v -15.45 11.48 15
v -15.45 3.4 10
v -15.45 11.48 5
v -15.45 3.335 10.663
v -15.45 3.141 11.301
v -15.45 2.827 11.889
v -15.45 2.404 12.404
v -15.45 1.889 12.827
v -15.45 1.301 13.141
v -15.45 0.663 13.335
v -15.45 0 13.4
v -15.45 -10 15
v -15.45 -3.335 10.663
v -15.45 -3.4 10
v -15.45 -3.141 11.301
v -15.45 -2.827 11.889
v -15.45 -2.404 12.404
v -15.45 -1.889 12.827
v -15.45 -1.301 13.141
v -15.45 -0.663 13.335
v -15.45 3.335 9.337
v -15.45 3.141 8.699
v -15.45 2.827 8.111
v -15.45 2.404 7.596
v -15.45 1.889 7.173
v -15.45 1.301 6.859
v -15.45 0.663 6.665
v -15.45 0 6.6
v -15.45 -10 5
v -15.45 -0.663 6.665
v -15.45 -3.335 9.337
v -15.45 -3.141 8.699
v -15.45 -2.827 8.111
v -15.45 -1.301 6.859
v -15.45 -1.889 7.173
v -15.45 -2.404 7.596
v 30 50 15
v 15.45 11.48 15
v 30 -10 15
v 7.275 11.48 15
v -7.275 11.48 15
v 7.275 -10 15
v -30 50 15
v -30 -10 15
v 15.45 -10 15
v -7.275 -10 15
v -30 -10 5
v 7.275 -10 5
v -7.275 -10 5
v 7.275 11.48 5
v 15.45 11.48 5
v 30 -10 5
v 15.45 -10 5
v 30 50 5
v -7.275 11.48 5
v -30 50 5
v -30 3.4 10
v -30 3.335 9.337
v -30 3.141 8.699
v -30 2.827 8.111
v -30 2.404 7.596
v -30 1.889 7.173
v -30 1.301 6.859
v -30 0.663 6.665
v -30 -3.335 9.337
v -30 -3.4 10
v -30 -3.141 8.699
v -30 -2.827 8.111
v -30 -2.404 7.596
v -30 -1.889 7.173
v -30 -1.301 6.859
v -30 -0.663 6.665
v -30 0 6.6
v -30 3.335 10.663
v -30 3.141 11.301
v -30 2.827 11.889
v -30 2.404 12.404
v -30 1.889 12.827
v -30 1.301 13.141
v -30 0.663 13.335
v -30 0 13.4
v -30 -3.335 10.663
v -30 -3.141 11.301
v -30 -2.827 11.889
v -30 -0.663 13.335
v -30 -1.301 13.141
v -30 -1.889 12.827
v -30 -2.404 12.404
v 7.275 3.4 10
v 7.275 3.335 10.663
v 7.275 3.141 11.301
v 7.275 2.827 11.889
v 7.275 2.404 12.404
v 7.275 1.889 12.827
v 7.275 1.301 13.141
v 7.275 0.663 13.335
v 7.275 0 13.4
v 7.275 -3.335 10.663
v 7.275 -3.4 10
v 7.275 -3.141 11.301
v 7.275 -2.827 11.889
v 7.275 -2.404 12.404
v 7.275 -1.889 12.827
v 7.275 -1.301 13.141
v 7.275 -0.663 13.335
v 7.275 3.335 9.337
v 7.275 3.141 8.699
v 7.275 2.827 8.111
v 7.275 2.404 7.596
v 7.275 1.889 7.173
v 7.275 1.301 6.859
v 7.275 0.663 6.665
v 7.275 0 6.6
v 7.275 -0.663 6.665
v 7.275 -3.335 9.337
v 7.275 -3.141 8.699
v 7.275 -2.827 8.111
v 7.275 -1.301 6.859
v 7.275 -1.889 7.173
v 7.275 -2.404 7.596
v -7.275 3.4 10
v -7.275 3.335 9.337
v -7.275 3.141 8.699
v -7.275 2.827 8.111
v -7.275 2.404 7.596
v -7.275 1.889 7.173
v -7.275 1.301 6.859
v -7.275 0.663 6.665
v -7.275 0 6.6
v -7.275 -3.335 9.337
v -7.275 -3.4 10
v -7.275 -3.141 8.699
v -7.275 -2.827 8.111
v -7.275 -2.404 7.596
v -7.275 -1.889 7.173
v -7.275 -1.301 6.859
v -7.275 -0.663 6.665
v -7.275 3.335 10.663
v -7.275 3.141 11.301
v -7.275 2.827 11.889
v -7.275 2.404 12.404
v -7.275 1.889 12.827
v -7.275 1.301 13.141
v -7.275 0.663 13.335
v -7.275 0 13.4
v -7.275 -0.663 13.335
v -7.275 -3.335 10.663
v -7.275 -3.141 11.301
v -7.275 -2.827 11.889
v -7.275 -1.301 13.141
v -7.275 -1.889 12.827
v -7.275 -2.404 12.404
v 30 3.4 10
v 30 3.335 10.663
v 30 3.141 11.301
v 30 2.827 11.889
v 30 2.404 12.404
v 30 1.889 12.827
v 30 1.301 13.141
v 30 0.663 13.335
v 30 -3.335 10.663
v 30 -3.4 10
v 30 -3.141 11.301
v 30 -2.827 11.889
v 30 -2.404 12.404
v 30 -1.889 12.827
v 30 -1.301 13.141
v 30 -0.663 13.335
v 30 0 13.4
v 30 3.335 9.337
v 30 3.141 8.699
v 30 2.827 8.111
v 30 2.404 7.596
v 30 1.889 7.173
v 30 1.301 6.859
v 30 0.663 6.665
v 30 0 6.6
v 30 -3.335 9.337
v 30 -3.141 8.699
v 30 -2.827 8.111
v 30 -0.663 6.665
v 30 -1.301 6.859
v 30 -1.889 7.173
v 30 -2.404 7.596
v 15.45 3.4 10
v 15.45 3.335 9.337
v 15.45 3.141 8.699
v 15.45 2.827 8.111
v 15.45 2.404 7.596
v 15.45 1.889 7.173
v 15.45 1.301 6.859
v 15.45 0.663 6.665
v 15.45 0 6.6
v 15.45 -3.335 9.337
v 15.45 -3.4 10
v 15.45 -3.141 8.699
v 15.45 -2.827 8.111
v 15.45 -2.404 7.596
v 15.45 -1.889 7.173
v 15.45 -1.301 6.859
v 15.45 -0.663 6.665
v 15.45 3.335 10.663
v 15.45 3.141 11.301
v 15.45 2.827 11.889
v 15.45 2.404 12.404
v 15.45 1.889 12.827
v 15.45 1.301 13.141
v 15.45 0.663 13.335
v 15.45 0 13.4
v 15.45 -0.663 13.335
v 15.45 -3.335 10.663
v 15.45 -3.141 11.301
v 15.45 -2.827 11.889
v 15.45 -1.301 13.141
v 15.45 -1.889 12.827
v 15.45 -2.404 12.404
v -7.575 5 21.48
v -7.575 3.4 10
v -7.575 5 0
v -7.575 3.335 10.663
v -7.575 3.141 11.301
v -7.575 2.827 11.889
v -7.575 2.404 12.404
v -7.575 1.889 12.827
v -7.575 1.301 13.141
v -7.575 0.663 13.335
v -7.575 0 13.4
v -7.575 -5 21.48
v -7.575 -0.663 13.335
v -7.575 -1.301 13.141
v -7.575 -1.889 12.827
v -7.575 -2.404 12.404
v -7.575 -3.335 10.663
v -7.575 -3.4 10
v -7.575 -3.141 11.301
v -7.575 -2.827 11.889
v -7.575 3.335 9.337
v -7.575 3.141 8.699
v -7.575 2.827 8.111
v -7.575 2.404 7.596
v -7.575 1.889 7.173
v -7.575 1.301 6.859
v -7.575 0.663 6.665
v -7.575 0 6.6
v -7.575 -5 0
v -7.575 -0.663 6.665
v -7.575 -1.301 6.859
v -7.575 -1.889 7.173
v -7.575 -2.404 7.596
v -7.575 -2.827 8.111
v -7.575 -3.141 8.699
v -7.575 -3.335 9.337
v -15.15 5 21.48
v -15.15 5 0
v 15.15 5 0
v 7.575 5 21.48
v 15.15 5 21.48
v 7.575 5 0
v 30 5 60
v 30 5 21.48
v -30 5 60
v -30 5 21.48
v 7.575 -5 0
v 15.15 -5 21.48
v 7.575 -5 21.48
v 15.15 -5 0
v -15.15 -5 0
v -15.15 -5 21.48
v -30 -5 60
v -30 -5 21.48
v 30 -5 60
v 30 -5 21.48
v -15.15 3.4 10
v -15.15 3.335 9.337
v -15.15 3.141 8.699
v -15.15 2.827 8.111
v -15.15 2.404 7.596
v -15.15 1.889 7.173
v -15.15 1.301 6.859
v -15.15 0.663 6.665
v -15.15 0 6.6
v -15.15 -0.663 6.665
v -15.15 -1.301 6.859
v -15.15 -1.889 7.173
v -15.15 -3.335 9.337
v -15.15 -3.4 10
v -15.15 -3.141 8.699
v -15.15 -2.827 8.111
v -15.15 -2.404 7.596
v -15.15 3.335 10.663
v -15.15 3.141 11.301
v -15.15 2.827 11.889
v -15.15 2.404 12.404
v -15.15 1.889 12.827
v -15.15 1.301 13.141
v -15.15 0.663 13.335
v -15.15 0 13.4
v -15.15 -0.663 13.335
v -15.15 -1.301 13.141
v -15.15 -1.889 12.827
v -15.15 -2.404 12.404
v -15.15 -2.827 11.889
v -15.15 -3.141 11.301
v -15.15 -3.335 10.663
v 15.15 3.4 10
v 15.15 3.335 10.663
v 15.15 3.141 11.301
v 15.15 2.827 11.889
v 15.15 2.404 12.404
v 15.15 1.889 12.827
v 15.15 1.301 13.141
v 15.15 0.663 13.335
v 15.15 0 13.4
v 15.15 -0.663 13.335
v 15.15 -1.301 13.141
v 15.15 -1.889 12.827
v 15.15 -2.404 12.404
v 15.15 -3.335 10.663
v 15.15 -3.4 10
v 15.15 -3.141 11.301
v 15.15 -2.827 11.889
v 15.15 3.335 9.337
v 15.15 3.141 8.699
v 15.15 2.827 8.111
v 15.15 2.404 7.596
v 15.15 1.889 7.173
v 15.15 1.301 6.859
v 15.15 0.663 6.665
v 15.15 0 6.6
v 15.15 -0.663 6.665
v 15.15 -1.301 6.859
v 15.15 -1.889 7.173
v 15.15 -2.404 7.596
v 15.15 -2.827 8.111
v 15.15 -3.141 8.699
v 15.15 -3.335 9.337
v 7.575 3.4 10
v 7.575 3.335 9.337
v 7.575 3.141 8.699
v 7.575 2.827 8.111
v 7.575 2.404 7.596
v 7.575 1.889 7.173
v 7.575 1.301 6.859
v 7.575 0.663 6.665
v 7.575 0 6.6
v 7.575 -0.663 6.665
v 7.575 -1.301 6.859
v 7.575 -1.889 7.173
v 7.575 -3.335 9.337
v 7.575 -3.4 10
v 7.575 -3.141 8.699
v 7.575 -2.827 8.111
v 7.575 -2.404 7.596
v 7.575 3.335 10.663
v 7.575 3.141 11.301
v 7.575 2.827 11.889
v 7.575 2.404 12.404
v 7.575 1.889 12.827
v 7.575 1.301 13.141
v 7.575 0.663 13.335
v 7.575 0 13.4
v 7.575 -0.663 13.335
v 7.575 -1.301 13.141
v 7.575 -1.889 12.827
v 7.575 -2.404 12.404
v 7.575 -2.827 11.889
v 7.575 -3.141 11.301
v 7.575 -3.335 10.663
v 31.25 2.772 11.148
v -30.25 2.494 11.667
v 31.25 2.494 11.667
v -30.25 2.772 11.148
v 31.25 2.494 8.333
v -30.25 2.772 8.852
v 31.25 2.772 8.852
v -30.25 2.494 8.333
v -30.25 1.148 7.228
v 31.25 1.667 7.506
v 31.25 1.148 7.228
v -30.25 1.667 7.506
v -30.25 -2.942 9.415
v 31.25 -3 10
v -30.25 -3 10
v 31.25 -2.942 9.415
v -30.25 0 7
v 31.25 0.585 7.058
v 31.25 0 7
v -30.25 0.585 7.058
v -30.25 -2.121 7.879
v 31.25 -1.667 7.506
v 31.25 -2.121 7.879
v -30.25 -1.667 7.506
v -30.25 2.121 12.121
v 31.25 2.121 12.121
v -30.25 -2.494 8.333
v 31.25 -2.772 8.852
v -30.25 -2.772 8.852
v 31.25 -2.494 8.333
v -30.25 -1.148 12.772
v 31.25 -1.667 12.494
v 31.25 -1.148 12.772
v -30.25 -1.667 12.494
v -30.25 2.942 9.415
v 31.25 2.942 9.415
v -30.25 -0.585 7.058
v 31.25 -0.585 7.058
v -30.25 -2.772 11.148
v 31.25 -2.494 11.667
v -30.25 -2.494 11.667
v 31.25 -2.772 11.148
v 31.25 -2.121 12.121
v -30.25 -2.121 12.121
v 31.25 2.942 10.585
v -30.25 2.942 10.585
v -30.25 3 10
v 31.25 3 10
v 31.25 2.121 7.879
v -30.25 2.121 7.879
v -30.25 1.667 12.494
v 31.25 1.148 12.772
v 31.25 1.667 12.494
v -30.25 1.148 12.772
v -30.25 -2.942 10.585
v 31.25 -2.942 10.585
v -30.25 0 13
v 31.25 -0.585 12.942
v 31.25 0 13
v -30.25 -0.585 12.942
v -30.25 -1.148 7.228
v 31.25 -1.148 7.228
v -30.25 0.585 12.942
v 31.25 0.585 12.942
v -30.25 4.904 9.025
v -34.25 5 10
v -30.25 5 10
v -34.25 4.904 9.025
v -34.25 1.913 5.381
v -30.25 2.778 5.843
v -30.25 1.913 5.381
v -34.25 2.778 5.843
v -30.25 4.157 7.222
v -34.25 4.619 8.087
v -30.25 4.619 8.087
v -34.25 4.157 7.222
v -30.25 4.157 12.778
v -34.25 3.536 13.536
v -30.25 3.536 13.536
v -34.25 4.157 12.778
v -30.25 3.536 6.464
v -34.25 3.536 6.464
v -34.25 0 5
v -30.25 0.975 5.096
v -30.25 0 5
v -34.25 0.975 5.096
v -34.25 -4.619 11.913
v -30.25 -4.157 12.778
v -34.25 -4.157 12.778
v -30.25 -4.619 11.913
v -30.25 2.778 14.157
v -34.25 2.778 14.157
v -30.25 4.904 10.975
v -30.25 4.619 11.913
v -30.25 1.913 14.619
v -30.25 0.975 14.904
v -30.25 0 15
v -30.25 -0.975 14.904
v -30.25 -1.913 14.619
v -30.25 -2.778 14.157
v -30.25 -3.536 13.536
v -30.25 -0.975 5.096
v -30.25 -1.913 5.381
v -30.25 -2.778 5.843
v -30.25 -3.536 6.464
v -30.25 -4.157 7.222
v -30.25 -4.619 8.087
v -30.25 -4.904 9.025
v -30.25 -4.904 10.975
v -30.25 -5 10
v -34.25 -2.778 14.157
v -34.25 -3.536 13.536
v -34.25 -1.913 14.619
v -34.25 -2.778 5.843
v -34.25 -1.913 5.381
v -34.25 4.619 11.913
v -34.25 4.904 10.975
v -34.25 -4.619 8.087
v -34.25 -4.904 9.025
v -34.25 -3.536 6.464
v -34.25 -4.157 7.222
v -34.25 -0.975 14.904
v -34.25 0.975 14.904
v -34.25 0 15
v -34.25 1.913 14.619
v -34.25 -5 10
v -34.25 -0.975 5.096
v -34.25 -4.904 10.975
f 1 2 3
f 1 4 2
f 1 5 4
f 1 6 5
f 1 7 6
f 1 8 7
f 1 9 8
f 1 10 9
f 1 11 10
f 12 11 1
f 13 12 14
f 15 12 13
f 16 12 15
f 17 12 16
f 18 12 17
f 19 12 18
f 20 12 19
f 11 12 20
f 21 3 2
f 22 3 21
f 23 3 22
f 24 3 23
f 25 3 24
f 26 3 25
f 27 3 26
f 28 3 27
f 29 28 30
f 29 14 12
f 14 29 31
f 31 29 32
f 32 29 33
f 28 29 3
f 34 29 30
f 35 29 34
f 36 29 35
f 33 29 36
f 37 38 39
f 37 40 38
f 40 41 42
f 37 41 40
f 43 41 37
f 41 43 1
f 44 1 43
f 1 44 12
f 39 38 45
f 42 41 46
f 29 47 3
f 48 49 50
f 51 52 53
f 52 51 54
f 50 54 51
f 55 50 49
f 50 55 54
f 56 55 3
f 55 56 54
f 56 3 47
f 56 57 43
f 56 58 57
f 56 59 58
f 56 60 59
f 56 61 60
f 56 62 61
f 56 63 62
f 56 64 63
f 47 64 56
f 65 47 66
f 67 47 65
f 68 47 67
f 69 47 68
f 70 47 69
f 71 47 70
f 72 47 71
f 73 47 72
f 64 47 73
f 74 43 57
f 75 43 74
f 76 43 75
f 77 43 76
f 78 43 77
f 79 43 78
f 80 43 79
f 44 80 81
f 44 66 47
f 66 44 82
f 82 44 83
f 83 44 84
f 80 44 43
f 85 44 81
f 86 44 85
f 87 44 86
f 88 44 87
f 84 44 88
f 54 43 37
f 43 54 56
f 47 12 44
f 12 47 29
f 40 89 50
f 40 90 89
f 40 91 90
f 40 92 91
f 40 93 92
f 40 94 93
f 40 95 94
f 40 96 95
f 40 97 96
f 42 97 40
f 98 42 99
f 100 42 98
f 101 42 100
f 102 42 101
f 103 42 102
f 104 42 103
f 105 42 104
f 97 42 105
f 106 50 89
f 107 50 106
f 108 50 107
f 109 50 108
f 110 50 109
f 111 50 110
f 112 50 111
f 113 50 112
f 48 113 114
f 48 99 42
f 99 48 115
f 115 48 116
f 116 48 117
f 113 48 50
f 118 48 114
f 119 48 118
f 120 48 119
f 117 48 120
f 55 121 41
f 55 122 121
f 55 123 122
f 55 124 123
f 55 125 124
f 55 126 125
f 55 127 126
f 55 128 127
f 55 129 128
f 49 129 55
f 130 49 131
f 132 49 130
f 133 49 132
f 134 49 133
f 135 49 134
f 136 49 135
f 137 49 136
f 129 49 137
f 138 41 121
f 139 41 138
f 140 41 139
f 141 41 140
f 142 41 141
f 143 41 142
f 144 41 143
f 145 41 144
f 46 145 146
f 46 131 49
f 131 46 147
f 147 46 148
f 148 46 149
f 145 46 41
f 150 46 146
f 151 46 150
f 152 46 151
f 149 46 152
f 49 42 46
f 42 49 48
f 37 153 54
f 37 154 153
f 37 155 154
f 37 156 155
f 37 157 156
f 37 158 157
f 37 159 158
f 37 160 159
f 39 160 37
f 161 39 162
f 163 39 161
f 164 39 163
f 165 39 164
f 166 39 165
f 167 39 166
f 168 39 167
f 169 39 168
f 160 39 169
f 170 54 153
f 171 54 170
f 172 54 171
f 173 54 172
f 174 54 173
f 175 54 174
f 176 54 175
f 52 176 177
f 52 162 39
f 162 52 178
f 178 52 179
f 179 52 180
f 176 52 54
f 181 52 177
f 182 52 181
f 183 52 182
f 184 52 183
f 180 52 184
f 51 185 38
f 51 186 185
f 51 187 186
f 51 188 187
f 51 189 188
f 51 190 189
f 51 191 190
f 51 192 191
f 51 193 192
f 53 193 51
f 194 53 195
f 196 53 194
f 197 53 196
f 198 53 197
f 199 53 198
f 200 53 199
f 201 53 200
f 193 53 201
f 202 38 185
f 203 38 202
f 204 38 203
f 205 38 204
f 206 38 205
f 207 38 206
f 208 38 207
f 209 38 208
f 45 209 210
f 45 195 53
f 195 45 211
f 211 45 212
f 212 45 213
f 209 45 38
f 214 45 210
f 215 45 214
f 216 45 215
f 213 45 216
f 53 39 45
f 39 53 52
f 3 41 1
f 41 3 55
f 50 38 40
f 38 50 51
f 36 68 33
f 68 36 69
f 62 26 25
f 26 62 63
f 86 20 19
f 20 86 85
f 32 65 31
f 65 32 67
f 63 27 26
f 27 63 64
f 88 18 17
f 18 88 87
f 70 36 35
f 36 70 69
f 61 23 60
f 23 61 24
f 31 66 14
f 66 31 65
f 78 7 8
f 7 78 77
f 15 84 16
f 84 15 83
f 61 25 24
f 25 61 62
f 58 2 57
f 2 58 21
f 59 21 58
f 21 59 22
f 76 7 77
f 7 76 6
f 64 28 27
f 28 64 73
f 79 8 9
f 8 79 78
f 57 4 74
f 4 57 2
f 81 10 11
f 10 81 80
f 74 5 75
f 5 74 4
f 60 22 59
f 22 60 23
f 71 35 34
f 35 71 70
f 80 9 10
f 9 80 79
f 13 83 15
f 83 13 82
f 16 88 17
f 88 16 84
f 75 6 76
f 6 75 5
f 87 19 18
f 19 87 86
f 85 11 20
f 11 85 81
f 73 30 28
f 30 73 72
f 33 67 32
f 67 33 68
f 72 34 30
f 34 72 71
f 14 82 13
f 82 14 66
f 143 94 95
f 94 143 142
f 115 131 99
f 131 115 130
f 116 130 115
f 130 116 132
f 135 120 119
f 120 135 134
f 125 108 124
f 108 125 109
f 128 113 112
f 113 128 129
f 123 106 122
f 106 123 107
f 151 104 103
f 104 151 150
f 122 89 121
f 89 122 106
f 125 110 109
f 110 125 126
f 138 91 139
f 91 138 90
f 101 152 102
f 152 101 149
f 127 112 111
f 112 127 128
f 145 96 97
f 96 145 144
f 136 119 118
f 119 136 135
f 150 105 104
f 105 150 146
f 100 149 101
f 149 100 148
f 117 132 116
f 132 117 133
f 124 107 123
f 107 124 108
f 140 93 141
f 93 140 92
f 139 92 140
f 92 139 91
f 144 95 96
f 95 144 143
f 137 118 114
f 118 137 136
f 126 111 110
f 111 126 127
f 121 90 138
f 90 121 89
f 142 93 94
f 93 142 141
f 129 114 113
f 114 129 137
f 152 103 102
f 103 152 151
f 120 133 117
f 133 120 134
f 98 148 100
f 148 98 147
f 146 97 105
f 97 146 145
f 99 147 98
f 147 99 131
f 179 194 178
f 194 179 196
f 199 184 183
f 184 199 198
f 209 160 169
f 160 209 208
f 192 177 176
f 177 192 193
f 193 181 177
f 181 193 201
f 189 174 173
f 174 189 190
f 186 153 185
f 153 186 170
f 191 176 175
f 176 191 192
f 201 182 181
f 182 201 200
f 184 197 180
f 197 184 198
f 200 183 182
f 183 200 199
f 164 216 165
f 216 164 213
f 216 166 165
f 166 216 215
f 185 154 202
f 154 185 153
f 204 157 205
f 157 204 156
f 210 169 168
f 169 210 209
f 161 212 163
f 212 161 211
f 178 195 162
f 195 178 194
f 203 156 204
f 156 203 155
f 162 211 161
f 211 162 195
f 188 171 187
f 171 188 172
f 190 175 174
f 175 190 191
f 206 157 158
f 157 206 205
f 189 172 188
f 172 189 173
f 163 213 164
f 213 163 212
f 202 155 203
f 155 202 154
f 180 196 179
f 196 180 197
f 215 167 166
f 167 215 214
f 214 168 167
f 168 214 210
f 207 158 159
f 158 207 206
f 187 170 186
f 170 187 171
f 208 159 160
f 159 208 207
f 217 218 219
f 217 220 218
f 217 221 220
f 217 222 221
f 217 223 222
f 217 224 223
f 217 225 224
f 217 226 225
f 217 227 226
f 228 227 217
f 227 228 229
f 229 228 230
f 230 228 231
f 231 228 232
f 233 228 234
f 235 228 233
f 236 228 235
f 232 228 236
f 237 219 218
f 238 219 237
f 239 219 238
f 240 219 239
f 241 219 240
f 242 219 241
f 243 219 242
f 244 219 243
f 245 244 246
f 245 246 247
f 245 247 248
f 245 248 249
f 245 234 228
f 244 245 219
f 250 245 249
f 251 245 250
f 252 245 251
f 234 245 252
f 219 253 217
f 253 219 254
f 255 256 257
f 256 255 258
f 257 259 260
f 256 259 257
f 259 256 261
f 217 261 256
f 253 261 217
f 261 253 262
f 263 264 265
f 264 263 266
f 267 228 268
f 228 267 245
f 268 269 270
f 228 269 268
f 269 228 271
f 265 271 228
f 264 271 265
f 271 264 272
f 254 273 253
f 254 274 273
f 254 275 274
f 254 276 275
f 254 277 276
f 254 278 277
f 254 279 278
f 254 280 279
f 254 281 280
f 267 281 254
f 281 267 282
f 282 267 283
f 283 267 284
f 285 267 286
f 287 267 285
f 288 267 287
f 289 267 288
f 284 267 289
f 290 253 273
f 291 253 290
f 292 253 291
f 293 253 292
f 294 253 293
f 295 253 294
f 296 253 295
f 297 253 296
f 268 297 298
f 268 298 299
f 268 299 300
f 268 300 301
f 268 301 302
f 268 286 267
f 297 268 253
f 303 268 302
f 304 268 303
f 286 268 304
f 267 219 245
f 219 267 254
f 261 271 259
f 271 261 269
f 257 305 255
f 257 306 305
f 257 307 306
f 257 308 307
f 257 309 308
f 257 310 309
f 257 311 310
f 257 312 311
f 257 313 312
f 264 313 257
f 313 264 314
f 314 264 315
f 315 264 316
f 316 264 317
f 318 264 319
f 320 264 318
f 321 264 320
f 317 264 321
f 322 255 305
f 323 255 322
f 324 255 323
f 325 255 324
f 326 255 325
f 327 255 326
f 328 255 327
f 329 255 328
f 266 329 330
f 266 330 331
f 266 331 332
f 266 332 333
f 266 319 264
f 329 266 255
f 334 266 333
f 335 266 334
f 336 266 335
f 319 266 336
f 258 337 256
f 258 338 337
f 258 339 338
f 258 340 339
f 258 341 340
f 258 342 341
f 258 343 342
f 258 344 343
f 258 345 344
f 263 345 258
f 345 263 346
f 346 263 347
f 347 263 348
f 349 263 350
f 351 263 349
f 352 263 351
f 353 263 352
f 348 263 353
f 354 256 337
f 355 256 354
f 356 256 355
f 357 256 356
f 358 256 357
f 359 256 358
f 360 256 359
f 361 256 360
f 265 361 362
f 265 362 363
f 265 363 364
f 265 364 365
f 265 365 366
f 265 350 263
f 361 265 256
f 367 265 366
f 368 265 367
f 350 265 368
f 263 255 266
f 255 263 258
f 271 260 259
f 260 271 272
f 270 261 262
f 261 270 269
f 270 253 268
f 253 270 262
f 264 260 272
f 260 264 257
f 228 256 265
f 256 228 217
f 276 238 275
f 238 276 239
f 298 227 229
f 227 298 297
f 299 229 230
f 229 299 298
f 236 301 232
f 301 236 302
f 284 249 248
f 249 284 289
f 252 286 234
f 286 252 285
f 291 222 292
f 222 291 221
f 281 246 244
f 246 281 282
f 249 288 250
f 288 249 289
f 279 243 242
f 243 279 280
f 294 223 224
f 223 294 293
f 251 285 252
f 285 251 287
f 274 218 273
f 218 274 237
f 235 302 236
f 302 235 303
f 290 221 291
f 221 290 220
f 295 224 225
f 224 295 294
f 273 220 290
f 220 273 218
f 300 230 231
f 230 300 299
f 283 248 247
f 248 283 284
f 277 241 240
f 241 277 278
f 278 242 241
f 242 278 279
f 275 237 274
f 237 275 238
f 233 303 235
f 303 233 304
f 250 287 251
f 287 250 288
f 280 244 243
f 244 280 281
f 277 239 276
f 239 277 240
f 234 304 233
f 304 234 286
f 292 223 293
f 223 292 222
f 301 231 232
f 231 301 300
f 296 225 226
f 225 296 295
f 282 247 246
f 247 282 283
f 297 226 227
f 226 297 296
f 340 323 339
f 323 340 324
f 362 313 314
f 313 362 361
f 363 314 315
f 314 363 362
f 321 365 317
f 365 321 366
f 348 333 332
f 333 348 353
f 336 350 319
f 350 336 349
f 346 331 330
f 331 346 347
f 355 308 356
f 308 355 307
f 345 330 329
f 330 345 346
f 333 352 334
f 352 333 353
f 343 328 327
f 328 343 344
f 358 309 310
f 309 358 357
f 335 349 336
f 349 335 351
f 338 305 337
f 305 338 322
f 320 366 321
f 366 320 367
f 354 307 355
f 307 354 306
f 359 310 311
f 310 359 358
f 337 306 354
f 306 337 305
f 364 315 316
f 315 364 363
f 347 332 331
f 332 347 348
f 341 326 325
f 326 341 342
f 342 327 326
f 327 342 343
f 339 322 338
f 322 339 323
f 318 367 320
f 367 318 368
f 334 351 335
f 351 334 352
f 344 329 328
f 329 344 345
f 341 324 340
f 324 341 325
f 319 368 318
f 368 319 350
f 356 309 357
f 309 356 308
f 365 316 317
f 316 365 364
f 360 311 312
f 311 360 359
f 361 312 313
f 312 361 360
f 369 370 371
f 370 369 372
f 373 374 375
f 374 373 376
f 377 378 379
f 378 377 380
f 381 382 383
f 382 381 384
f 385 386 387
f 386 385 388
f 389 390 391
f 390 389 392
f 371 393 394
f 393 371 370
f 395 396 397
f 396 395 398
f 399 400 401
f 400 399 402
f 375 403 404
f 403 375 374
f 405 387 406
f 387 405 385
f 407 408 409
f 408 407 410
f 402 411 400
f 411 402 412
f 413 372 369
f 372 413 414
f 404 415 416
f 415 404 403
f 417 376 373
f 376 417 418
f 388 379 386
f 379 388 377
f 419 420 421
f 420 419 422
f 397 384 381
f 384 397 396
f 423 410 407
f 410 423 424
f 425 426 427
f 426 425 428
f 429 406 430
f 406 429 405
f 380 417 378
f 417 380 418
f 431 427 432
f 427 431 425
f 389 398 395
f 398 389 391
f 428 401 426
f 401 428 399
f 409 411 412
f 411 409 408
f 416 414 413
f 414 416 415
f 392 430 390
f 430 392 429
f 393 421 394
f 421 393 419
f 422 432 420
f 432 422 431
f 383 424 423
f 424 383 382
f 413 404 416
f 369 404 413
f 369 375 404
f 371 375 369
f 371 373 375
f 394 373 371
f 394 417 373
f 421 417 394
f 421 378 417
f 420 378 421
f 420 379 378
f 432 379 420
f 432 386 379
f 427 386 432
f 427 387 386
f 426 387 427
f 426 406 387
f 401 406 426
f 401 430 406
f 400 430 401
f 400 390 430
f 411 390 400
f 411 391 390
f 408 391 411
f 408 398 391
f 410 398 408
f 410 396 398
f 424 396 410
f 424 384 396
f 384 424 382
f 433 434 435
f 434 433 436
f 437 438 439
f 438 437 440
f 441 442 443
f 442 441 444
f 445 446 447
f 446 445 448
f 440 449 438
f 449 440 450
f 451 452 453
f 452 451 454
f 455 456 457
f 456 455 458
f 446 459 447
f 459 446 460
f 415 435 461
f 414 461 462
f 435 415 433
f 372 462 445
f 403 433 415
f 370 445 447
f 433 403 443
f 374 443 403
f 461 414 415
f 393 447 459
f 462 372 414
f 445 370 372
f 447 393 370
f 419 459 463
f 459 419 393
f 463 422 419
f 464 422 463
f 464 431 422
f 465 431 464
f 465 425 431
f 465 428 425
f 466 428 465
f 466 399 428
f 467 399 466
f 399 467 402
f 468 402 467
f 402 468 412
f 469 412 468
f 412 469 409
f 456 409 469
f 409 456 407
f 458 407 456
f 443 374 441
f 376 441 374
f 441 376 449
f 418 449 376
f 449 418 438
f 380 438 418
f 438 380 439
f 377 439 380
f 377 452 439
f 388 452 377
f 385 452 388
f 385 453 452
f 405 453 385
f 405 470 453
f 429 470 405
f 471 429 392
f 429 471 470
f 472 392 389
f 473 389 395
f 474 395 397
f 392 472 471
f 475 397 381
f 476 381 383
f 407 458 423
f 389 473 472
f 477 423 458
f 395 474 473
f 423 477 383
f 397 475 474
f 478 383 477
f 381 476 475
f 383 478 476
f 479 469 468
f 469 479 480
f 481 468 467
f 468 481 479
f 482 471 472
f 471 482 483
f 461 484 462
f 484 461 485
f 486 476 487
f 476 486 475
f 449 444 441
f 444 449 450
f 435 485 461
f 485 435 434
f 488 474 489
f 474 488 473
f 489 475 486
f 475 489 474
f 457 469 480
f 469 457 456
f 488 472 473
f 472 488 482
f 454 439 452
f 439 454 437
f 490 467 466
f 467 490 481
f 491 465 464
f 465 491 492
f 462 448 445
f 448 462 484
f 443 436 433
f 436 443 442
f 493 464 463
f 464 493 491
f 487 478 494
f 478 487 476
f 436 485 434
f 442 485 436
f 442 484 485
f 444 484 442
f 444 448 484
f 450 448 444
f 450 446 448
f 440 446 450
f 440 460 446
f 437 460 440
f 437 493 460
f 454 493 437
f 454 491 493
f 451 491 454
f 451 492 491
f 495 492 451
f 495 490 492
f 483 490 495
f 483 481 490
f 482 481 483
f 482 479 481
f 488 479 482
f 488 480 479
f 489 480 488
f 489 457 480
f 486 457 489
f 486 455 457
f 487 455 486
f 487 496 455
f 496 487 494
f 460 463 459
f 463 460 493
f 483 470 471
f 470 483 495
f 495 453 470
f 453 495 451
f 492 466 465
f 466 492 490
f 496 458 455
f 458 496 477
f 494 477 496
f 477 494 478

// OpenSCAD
$fn = 32;

// ------------------------------------------------------------------------
// Butt hinge: hinge 60 mm, leaf swung 270 deg
// Every part is its own module, assembly() places every instance.
// ------------------------------------------------------------------------

// --- part 1 ---
module hinge_base() {
  difference() {
    union() {
      translate([-30, -10, -5]) cube([14.55, 60, 10]);
      translate([-7.275, -10, -5]) cube([14.55, 60, 10]);
      translate([15.45, -10, -5]) cube([14.55, 60, 10]);
      translate([-30, 11.48, -5]) cube([60, 38.52, 10]);
    }
    translate([-22.725, 0, 0]) rotate([0, 90, 0]) cylinder(h = 16.55, d = 6.8, center = true);
    translate([0, 0, 0]) rotate([0, 90, 0]) cylinder(h = 16.55, d = 6.8, center = true);
    translate([22.725, 0, 0]) rotate([0, 90, 0]) cylinder(h = 16.55, d = 6.8, center = true);
  }
}

// --- part 2 ---
module hinge_mover() {
  difference() {
    union() {
      translate([-15.15, -50, -5]) cube([7.575, 60, 10]);
      translate([7.575, -50, -5]) cube([7.575, 60, 10]);
      translate([-30, -50, -5]) cube([60, 38.52, 10]);
    }
    translate([-11.362, 0, 0]) rotate([0, 90, 0]) cylinder(h = 9.575, d = 6.8, center = true);
    translate([11.362, 0, 0]) rotate([0, 90, 0]) cylinder(h = 9.575, d = 6.8, center = true);
  }
}

// --- part 3 ---
module hinge_pin() {
  rotate([0, 90, 0]) cylinder(h = 62.5, d = 6, center = true);
  translate([-34.25, 0, 0]) rotate([0, 90, 0]) cylinder(h = 4, d = 10);
}

// --- assembly ---
module assembly() {
  color([0.80, 0.24, 0.20]) translate([0, 0, 10]) rotate([0, 0, 0]) hinge_base();
  color([0.20, 0.45, 0.75]) translate([0, 0, 10]) rotate([270, 0, 0]) hinge_mover();
  color([0.25, 0.62, 0.32]) translate([0, 0, 10]) rotate([0, 0, 0]) hinge_pin();
}

assembly();
